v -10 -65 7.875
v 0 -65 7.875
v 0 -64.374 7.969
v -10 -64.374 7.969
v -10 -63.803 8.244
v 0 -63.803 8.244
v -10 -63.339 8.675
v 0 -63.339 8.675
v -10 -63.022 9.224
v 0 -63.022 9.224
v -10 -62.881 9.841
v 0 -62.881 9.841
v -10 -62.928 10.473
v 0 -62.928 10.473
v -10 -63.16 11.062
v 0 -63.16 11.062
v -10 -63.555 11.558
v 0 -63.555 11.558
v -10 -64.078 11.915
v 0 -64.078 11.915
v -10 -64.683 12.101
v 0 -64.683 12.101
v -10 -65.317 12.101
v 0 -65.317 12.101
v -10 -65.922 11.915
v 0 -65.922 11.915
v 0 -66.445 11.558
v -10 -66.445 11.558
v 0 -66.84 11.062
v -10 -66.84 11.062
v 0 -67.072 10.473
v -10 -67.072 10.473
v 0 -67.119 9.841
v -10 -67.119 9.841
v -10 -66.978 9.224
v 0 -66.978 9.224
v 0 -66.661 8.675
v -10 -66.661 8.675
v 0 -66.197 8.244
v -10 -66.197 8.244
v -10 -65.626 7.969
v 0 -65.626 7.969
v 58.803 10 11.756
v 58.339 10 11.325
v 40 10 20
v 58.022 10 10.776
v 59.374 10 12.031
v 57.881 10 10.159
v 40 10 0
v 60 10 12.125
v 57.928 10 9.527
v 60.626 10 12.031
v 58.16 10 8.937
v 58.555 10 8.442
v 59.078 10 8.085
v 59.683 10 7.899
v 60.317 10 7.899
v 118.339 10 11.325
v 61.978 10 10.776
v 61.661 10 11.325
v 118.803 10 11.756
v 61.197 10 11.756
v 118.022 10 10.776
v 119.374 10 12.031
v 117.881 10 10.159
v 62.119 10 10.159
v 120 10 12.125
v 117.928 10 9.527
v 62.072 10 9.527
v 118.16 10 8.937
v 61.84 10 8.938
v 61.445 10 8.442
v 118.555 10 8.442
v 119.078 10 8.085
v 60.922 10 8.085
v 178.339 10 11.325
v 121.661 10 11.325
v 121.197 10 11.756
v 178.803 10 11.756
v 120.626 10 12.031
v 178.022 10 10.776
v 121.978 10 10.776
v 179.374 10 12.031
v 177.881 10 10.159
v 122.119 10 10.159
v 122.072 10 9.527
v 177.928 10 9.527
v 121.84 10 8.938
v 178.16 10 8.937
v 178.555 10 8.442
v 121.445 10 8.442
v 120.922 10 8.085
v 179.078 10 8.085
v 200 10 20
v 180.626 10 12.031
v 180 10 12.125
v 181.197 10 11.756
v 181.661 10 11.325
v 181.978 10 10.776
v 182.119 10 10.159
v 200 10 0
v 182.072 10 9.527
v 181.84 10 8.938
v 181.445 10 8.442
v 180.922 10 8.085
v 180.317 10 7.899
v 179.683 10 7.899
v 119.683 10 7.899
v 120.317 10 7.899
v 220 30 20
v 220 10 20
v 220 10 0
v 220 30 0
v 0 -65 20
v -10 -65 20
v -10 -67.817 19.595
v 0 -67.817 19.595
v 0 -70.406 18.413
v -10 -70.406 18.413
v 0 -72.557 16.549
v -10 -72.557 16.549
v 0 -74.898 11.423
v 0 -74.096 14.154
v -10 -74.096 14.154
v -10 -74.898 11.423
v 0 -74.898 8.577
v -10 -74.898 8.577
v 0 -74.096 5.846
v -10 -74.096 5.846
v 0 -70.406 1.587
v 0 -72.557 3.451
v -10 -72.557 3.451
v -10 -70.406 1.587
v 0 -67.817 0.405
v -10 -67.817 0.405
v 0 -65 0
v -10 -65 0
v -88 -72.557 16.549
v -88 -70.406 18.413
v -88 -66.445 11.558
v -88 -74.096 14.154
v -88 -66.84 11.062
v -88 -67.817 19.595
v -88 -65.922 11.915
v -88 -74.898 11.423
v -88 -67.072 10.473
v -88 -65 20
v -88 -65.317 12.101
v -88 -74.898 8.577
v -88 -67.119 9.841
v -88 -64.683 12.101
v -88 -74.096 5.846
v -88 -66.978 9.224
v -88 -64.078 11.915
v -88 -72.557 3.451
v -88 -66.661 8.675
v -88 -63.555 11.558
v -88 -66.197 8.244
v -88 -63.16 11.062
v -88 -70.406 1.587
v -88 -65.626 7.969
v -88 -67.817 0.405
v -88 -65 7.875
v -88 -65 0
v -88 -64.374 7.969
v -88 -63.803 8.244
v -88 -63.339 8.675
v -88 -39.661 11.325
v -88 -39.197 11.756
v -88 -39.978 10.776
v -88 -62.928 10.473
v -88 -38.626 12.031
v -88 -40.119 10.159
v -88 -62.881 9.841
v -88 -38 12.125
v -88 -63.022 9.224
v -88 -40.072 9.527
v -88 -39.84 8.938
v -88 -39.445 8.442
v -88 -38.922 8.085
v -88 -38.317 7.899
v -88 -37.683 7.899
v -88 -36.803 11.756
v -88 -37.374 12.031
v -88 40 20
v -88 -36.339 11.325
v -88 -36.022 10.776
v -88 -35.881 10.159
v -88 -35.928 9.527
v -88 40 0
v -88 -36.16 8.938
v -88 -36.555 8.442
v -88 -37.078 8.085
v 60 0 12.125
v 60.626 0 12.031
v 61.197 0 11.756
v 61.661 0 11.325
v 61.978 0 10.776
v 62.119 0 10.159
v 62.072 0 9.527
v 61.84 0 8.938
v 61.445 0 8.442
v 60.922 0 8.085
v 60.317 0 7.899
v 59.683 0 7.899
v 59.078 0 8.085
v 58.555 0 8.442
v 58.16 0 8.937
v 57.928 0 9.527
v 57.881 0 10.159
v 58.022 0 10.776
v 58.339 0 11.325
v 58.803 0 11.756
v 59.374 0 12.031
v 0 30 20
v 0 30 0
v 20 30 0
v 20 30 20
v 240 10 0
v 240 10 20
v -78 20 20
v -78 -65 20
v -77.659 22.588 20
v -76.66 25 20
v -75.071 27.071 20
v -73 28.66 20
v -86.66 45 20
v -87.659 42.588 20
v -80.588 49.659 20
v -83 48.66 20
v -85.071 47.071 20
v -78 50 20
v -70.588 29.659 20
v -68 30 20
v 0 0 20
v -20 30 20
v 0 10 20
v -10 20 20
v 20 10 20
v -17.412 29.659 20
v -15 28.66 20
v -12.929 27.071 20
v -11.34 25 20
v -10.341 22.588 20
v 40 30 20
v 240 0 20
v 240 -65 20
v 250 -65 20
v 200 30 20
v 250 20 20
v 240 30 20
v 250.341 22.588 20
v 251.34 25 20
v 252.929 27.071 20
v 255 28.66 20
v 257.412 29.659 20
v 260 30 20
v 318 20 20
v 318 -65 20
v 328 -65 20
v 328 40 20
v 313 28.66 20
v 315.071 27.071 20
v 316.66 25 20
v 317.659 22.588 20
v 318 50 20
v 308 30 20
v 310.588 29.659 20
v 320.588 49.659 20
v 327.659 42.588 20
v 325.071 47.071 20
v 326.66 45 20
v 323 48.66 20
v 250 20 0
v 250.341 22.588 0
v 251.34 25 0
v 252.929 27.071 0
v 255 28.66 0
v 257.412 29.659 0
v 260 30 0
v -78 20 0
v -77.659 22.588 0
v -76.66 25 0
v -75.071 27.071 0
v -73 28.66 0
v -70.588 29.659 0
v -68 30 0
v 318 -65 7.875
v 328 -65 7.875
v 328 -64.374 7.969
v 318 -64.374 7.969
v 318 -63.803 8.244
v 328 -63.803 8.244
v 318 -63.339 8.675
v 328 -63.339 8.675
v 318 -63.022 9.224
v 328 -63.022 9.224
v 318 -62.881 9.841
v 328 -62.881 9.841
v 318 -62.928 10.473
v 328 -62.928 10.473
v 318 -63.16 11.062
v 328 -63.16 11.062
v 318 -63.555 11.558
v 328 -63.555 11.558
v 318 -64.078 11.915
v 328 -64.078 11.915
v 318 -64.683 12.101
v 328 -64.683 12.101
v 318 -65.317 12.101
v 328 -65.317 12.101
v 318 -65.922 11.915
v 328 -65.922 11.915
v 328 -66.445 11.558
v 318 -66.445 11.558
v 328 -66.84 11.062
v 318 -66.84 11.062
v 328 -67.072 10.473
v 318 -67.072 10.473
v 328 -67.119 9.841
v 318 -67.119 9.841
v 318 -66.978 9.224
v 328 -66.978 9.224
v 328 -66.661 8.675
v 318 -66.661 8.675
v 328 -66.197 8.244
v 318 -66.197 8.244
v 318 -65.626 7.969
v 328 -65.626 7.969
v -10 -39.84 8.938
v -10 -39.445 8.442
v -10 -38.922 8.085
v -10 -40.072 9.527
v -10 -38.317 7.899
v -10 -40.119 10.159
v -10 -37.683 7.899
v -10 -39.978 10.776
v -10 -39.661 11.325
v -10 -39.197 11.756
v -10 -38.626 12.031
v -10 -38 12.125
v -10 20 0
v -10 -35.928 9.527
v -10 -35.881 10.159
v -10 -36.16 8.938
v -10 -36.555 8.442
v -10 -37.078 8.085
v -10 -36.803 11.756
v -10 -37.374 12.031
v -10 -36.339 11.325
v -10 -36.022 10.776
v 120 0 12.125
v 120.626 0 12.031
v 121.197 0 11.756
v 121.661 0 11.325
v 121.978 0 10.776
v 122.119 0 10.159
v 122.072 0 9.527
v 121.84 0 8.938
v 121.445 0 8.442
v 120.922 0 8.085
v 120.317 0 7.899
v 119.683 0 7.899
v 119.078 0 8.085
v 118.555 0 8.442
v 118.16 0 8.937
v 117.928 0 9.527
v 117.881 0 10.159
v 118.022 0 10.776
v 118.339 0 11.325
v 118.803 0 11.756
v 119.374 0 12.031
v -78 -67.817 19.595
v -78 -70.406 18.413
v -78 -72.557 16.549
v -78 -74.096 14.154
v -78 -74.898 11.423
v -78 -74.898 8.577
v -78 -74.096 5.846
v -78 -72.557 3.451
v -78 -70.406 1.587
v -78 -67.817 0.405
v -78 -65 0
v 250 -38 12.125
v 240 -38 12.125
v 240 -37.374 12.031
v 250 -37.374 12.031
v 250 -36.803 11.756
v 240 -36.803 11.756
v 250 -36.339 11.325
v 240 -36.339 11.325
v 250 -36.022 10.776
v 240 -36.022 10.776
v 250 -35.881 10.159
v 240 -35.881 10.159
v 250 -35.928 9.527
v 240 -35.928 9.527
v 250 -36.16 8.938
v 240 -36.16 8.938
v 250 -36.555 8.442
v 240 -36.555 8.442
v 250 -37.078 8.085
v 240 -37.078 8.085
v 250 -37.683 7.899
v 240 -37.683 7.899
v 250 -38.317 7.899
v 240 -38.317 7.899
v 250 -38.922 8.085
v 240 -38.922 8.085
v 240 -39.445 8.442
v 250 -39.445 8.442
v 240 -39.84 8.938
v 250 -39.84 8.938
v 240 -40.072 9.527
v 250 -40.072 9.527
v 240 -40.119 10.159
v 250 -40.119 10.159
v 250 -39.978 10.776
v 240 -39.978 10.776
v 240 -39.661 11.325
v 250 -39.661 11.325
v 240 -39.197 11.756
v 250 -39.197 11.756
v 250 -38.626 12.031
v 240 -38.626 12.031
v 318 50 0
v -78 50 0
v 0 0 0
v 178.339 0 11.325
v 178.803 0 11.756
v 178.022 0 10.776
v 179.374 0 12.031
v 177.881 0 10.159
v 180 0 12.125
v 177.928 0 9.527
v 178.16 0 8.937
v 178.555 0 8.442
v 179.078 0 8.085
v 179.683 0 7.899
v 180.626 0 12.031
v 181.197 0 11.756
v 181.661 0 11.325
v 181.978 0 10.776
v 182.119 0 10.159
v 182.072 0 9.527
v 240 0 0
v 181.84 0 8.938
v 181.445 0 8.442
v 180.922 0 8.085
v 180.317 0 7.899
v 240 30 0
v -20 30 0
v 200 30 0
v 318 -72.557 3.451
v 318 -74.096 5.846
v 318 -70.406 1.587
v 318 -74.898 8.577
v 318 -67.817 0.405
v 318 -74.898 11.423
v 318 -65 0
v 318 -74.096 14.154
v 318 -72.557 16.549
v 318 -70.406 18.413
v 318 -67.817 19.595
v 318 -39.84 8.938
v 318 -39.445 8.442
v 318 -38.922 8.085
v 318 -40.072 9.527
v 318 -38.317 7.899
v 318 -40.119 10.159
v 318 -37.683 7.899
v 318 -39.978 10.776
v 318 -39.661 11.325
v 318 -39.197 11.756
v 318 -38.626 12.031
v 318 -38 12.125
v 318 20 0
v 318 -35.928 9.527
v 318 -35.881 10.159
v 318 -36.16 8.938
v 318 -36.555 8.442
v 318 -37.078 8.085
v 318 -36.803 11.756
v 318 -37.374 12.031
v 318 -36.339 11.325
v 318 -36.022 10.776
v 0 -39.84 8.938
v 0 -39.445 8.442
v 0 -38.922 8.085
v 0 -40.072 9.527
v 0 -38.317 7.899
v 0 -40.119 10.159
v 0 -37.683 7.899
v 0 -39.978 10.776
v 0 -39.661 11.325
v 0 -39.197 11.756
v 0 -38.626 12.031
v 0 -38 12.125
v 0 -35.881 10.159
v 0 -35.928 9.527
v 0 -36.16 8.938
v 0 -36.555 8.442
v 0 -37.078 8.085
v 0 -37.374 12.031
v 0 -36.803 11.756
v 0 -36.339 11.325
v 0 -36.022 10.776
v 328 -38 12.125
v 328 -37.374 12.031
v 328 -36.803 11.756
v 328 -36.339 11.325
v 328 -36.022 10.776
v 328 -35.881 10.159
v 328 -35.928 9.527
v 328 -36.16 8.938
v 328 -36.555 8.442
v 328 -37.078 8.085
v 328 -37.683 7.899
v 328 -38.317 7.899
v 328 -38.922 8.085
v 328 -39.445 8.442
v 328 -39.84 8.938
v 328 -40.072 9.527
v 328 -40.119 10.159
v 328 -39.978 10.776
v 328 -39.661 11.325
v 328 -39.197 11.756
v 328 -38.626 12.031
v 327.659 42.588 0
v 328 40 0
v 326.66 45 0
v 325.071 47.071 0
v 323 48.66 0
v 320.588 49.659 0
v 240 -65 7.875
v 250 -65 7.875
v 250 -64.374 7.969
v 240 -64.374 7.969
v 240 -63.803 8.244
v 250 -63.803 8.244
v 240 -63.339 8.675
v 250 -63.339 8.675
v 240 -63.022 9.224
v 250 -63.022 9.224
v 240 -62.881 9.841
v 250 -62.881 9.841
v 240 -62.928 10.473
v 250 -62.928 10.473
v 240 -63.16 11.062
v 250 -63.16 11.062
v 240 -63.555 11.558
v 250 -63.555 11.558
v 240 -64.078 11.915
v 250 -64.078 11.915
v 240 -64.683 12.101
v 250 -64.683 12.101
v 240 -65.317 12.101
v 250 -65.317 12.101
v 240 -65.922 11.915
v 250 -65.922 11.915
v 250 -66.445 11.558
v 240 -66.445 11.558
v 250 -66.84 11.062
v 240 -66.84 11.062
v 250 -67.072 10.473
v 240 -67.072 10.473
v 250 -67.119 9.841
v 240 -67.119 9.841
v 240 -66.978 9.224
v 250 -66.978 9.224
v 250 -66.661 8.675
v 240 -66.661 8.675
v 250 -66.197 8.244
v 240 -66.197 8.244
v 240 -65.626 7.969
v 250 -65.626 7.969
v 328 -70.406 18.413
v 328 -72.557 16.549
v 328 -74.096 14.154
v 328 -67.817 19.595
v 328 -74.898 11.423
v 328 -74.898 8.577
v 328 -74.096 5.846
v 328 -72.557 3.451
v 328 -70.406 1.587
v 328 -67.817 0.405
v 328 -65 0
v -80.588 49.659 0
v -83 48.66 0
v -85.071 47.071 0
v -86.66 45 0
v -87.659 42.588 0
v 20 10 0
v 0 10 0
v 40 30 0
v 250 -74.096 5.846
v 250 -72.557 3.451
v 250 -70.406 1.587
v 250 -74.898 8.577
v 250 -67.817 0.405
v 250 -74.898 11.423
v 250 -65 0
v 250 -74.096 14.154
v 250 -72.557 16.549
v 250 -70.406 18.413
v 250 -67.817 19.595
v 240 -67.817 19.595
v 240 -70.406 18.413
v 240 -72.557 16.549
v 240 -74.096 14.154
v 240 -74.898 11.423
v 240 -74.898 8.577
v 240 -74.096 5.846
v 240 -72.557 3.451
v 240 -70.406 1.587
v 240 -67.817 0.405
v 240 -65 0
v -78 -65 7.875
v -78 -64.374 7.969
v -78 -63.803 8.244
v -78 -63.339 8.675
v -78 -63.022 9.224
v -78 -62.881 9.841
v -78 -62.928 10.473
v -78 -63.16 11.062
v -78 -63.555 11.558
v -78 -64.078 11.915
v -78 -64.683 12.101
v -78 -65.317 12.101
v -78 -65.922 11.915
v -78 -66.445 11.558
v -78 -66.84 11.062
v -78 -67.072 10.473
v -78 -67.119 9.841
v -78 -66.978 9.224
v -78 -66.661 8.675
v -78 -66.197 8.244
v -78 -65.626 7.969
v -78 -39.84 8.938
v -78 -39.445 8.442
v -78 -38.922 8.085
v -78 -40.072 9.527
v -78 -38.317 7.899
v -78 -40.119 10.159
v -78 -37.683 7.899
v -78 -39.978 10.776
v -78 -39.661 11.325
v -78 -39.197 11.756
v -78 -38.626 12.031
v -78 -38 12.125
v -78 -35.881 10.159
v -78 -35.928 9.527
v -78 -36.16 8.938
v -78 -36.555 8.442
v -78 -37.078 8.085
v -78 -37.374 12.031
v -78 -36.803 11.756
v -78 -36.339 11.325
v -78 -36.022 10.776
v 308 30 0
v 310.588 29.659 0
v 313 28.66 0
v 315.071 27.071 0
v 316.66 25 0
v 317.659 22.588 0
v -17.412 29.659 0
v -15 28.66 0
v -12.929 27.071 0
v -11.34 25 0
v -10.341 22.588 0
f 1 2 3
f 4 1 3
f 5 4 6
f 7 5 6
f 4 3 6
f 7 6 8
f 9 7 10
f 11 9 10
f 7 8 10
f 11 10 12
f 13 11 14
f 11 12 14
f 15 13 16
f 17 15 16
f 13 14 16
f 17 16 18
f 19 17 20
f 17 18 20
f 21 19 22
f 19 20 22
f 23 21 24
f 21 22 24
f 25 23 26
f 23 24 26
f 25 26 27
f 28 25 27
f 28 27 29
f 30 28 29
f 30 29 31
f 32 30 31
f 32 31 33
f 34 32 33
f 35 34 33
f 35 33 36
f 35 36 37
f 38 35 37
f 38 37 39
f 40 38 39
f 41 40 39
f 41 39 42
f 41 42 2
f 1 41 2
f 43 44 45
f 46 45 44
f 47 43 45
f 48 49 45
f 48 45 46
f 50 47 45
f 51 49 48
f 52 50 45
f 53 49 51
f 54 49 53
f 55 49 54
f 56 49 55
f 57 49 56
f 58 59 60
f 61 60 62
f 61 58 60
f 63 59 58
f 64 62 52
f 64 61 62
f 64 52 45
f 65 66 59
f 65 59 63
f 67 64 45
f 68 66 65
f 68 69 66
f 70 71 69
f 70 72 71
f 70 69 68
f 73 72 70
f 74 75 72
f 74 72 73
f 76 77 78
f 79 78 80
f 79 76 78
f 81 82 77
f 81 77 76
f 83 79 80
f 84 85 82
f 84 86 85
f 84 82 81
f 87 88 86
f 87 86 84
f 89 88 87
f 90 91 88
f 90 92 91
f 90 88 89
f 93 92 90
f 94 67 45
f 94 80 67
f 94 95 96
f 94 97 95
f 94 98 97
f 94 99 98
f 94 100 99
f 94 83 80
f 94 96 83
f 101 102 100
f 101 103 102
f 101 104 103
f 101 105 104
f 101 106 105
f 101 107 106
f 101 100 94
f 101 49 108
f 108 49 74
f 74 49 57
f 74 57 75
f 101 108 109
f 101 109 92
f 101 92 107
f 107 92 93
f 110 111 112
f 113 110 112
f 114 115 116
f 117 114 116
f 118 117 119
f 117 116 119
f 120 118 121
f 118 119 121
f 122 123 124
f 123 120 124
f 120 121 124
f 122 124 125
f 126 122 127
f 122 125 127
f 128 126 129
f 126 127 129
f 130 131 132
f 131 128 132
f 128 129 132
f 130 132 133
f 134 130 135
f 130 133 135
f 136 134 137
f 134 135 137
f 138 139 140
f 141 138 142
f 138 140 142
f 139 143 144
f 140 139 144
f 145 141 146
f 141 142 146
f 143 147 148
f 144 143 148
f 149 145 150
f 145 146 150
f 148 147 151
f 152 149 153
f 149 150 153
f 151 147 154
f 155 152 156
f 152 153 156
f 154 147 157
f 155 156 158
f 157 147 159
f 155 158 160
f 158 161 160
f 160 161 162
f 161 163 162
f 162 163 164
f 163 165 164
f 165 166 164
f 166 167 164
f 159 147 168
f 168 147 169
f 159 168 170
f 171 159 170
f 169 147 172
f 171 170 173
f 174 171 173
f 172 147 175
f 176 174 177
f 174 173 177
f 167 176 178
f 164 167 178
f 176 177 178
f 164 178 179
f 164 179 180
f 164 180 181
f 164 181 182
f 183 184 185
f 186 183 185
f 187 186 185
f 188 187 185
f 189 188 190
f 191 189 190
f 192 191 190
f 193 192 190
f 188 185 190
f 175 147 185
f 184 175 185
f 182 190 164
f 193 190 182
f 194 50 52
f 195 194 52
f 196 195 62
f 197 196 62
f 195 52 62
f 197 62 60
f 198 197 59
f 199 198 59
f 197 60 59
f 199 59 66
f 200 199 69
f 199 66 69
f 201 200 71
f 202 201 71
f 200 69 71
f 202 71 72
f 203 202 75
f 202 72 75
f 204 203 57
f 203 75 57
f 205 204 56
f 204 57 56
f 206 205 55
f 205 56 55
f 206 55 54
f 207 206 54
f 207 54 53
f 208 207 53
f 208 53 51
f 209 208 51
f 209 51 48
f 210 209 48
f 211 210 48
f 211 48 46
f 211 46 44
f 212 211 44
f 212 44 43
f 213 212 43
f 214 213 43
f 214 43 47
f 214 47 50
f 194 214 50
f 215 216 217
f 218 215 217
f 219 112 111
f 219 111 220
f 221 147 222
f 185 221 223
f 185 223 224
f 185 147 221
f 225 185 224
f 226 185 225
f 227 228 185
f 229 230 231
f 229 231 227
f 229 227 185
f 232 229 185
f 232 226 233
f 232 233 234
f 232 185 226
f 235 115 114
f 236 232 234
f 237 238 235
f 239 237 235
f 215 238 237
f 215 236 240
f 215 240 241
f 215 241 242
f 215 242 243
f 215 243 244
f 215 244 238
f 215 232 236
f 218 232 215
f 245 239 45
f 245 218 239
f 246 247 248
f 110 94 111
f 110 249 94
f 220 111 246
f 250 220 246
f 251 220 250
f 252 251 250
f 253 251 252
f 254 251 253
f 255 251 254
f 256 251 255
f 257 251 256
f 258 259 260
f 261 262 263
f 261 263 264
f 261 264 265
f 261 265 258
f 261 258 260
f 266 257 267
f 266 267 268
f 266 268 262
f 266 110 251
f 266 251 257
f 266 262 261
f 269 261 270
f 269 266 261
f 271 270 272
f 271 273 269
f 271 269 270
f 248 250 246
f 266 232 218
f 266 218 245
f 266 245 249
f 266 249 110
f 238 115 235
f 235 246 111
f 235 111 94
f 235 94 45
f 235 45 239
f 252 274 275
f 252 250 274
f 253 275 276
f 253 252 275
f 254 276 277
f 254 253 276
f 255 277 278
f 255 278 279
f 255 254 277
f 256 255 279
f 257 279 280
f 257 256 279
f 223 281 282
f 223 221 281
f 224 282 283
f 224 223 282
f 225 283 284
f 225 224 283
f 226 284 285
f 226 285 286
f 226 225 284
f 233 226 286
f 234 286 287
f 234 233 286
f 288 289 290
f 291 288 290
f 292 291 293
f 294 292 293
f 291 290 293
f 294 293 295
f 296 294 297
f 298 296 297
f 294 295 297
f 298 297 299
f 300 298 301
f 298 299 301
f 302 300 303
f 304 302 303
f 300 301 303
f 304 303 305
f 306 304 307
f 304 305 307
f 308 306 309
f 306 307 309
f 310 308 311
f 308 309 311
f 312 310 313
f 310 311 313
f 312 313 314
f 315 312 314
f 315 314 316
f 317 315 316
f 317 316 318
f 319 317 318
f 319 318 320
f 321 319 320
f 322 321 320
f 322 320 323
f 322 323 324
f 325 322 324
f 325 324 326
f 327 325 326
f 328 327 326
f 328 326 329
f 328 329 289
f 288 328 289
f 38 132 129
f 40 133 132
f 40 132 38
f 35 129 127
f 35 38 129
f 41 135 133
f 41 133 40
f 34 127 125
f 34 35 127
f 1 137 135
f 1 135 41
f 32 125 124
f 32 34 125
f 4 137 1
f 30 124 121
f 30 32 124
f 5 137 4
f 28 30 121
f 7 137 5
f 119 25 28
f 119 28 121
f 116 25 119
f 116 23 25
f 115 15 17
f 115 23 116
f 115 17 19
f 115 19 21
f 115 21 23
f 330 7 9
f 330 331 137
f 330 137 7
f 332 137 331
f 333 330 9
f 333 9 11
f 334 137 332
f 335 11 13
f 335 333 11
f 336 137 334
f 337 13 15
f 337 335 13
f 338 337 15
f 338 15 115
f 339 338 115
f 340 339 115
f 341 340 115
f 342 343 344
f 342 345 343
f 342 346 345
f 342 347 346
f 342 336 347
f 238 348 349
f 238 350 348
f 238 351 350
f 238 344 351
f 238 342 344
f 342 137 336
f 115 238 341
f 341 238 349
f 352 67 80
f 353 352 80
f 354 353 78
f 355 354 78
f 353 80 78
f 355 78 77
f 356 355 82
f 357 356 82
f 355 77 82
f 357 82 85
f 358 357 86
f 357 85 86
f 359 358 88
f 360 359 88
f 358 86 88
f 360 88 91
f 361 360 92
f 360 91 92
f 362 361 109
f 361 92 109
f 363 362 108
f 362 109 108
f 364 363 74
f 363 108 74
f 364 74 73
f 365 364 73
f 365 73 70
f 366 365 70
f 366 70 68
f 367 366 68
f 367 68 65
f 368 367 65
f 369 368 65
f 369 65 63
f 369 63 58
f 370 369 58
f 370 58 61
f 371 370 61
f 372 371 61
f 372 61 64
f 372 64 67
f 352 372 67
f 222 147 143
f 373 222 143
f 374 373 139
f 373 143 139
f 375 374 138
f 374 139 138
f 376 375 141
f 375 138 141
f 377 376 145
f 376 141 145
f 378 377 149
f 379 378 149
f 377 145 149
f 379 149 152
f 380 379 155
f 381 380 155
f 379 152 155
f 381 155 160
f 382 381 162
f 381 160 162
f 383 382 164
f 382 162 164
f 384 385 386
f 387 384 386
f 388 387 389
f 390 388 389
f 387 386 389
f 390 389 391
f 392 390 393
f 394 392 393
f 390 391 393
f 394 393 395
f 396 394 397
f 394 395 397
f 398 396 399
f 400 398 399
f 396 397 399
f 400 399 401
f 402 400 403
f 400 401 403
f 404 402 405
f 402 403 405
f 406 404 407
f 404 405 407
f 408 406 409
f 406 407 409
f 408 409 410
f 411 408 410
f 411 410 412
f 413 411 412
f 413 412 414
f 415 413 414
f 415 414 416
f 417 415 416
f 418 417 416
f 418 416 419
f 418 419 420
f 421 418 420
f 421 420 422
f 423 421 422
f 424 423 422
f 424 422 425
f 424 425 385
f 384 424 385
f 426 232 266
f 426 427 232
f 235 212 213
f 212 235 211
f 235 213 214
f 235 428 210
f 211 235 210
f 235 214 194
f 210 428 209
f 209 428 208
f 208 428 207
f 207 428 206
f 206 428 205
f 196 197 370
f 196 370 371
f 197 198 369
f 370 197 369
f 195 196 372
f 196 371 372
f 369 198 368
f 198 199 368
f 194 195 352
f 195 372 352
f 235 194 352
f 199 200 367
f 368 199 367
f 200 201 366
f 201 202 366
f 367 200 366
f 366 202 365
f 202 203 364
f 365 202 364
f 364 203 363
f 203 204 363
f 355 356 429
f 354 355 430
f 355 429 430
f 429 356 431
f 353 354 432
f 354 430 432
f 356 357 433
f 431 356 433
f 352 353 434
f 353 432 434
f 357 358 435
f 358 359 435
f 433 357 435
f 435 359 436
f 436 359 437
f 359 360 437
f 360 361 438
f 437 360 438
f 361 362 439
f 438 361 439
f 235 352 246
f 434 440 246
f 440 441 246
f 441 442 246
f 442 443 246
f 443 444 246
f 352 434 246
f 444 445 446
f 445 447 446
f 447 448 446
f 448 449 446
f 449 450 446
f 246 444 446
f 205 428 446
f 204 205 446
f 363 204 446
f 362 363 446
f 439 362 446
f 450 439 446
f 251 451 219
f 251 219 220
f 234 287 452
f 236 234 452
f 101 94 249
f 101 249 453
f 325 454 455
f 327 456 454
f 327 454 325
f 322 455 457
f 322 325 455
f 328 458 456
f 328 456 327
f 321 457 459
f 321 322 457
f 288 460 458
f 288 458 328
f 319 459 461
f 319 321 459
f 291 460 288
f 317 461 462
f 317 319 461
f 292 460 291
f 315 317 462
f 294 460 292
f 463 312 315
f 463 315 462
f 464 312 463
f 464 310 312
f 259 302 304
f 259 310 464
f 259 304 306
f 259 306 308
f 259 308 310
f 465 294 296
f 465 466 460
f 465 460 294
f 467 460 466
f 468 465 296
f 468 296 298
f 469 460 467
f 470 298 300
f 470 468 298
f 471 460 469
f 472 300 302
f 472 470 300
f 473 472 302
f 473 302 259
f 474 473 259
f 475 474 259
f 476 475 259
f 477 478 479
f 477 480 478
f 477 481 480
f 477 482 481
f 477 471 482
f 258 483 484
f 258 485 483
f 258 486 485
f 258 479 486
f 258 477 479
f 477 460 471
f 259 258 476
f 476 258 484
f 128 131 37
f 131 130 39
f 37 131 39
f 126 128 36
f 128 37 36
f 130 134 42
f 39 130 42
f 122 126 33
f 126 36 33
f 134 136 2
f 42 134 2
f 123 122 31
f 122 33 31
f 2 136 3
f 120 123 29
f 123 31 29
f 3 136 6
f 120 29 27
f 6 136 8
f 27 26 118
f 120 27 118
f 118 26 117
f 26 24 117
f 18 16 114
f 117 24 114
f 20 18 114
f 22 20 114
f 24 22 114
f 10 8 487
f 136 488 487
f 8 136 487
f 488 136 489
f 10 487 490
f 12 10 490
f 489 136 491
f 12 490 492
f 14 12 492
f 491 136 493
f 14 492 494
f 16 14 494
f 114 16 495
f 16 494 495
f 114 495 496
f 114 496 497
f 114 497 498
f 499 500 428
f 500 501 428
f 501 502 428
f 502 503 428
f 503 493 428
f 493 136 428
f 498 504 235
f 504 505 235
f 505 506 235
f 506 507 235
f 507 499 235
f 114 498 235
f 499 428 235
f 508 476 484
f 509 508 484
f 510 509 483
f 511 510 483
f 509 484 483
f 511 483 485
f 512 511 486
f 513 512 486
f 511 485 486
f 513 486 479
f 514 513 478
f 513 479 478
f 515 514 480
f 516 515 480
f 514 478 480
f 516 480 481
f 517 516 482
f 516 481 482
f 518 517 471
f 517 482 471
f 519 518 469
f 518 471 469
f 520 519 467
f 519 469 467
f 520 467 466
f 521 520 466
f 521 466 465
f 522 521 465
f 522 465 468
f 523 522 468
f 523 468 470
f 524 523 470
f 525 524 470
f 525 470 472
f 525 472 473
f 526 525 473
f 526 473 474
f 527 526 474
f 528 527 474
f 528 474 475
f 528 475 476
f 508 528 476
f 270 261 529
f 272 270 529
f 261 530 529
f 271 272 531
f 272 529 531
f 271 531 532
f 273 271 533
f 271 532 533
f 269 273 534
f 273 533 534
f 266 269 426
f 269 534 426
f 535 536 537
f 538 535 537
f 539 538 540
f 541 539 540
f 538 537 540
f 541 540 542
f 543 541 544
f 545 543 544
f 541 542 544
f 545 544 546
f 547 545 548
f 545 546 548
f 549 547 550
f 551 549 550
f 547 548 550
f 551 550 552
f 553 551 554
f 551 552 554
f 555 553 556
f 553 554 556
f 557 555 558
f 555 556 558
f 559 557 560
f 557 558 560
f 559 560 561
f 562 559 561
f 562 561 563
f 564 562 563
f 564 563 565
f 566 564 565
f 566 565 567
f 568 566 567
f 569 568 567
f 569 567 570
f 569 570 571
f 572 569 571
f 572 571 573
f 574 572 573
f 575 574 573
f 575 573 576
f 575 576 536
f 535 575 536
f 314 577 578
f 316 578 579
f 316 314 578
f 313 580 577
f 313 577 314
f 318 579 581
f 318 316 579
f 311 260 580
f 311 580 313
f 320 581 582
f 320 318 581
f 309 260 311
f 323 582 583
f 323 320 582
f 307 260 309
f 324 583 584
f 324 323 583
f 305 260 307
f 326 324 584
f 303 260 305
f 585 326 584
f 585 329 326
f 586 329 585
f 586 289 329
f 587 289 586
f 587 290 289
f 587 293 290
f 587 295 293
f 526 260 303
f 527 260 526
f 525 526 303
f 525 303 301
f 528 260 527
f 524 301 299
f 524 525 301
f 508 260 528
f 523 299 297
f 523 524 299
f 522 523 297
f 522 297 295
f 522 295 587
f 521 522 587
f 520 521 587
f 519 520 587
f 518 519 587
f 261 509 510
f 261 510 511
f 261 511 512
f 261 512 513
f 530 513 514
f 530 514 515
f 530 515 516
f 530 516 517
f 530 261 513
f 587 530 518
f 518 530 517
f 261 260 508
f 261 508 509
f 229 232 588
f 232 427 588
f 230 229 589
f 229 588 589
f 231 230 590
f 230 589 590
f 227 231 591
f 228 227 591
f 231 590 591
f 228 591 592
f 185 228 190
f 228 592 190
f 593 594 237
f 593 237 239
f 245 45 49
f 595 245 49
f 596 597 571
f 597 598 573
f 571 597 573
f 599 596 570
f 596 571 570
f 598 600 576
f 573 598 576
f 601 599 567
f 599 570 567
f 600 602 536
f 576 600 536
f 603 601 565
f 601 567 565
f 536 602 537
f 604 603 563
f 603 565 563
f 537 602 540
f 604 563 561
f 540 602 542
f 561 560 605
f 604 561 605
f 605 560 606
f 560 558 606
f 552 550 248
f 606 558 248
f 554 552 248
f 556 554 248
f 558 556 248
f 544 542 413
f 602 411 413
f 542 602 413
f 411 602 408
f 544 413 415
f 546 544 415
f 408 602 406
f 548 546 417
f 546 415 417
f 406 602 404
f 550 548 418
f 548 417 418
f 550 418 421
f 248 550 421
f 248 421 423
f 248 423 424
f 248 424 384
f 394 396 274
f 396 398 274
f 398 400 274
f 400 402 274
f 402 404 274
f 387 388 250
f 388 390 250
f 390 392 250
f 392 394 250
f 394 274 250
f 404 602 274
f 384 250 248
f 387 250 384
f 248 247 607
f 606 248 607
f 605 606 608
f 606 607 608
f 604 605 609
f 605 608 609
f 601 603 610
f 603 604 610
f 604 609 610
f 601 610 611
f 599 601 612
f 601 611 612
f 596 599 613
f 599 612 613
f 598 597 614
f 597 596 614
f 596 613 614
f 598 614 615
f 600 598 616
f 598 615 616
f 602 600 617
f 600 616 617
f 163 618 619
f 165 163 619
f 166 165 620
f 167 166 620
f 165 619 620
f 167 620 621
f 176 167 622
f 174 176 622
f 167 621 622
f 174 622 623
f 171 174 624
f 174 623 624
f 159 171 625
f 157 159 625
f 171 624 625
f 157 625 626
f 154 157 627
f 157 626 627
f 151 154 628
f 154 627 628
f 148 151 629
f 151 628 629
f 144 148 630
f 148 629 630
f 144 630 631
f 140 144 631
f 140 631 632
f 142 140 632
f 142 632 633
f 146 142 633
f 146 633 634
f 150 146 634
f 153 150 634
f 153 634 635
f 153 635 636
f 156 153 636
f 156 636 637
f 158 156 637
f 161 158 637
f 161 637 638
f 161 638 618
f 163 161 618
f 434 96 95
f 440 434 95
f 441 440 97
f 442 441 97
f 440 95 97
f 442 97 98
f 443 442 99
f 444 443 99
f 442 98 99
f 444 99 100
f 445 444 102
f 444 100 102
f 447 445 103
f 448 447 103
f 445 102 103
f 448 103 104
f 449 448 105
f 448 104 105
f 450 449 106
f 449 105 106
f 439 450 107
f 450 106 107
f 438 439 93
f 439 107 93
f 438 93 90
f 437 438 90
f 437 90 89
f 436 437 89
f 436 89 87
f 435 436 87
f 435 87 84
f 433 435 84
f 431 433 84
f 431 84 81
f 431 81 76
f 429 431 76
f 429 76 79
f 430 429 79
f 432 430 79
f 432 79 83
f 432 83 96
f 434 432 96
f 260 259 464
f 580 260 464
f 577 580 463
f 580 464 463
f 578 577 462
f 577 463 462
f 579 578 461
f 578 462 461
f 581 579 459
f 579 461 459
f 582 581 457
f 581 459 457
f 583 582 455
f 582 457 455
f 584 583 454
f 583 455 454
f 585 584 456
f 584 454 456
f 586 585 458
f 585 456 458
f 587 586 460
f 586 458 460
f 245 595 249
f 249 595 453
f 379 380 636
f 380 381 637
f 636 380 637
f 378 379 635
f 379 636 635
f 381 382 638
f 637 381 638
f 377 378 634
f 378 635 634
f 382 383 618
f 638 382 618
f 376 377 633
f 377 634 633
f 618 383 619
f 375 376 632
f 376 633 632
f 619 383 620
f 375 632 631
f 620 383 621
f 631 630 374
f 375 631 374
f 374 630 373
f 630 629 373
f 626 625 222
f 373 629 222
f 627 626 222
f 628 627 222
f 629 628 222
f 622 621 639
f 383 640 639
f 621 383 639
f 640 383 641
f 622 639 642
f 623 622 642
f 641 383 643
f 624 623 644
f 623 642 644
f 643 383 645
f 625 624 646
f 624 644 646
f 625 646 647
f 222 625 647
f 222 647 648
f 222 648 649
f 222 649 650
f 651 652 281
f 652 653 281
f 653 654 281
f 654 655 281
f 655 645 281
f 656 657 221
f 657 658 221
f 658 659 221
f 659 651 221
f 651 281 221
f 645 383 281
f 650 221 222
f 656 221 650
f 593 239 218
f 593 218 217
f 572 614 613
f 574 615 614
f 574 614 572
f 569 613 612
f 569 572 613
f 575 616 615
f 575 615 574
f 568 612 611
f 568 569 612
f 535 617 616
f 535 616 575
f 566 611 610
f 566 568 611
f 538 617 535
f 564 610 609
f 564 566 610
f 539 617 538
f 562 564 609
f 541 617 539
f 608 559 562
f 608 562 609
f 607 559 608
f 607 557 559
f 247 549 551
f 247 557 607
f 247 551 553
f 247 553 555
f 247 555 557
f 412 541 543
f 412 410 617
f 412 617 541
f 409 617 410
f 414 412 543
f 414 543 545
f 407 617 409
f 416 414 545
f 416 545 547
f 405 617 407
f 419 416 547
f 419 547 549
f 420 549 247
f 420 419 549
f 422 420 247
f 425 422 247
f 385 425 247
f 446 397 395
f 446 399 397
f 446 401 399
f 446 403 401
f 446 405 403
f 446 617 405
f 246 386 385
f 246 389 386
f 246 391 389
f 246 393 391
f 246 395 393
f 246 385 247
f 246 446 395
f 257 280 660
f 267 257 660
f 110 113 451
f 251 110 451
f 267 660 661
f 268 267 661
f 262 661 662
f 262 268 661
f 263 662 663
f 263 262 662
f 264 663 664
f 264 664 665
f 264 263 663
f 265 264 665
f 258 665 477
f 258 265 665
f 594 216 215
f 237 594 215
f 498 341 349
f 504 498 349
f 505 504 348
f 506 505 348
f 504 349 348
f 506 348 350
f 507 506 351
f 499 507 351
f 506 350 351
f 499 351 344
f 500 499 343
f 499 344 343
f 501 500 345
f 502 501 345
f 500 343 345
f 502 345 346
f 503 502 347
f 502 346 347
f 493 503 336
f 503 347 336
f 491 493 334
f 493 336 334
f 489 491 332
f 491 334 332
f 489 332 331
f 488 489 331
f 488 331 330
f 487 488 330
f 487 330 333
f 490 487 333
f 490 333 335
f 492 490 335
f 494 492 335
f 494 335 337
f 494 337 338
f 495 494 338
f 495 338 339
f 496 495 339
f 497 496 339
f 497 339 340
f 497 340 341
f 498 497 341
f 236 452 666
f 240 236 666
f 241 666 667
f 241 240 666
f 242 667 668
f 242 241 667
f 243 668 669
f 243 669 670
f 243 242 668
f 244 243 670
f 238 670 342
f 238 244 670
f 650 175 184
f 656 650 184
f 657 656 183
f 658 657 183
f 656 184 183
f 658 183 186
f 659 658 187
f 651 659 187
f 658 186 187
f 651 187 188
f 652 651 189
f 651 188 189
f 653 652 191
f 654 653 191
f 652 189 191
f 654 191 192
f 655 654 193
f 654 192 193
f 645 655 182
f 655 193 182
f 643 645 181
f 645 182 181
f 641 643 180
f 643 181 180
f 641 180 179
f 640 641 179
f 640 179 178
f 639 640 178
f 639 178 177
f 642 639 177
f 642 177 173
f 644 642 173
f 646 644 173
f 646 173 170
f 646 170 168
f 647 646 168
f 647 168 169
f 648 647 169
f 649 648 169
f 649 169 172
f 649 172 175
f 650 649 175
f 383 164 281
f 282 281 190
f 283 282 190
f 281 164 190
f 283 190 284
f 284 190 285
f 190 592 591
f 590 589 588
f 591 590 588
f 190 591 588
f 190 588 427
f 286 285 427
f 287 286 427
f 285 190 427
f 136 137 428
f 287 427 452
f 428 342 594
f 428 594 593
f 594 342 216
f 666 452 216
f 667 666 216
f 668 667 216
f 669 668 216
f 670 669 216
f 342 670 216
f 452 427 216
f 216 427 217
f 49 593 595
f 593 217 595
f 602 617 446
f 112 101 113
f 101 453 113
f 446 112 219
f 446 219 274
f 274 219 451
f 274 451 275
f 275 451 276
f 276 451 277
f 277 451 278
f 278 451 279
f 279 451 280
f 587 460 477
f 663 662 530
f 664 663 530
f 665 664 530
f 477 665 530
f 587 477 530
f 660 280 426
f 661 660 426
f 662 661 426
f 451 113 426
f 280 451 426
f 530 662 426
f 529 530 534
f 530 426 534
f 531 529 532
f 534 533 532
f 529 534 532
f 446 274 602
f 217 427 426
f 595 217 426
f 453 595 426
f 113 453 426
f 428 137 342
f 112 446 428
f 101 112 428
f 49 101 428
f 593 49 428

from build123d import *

# Parameters (mm, degrees)
SKETCH2_W           = 240
SKETCH2_H           = 10
BOSS_EXTRUDE1_DEPTH = 20
SKETCH3_R           = 2.125
CUT_EXTRUDE1_DEPTH  = 20
SKETCH4_W           = 20
SKETCH4_H           = 20
BOSS_EXTRUDE2_DEPTH = 20
SKETCH5_W           = 416
SKETCH5_H           = 20
BOSS_EXTRUDE3_DEPTH = 20
SKETCH6_W           = 10
SKETCH6_H           = 20
BOSS_EXTRUDE4_DEPTH = 95
BOSS_EXTRUDE5_REACH = 423.522
SKETCH8_W           = 68
SKETCH8_H           = 10
SKETCH8_W_2         = 240
CUT_EXTRUDE2_DEPTH  = 65
CUT_EXTRUDE3_REACH  = 425.18
SKETCH9_R           = 2.125
FILLET1_R           = 10
CUT_EXTRUDE4_REACH  = 425.18
SKETCH10_R          = 2.125


with BuildPart() as part:
    # Sketch2 → Boss-Extrude1 (new body)
    with BuildSketch(Plane.XY):
        with Locations((120, 5)):
            Rectangle(SKETCH2_W, SKETCH2_H)
    extrude(amount=BOSS_EXTRUDE1_DEPTH)

    # Sketch3 → Cut-Extrude1 (cut)
    with BuildSketch(Plane(origin=(0, 10, 0), x_dir=(1, 0, 0), z_dir=(0, 1, 0))):
        with Locations(Location((60, -10, 0), (0, 0, 270))):
            Circle(SKETCH3_R)
        with Locations(Location((120, -10, 0), (0, 0, 270))):
            Circle(SKETCH3_R)
        with Locations(Location((180, -10, 0), (0, 0, 270))):
            Circle(SKETCH3_R)
    extrude(amount=-CUT_EXTRUDE1_DEPTH, mode=Mode.SUBTRACT)

    # Sketch4 → Boss-Extrude2 (add)
    with BuildSketch(Plane(origin=(0, 10, 0), x_dir=(1, 0, 0), z_dir=(0, 1, 0))):
        with Locations((30, -10)):
            Rectangle(SKETCH4_W, SKETCH4_H)
        with Locations((210, -10)):
            Rectangle(SKETCH4_W, SKETCH4_H)
    extrude(amount=BOSS_EXTRUDE2_DEPTH)

    # Sketch5 → Boss-Extrude3 (add)
    with BuildSketch(Plane(origin=(0, 30, 0), x_dir=(1, 0, 0), z_dir=(0, 1, 0))):
        with Locations((120, -10)):
            Rectangle(SKETCH5_W, SKETCH5_H)
    extrude(amount=BOSS_EXTRUDE3_DEPTH)

    # Sketch6 → Boss-Extrude4 (add)
    with BuildSketch(Plane.XZ.offset(-30)):
        with Locations((245, 10)):
            Rectangle(SKETCH6_W, SKETCH6_H)
        with Locations((-5, 10)):
            Rectangle(SKETCH6_W, SKETCH6_H)
        with Locations((323, 10)):
            Rectangle(SKETCH6_W, SKETCH6_H)
        with Locations((-83, 10)):
            Rectangle(SKETCH6_W, SKETCH6_H)
    extrude(amount=BOSS_EXTRUDE4_DEPTH)

    # Boss-Extrude5: up to this face of the body (flat: up to its plane)
    boss_extrude5_end = Plane(part.part.faces().sort_by_distance((328, -7.5, 10))[0])
    # Sketch7 → Boss-Extrude5 (add, up to the picked face)
    with BuildSketch(Plane.ZY.offset(88), mode=Mode.PRIVATE) as boss_extrude5_sk1:
        with BuildLine():
            Line((0, -65), (20, -65))
            ThreePointArc((20, -65), (10, -75), (0, -65))
        make_face()
    boss_extrude5_tool1 = split(extrude(boss_extrude5_sk1.sketch, amount=-BOSS_EXTRUDE5_REACH, mode=Mode.PRIVATE), bisect_by=boss_extrude5_end, keep=Keep.BOTH, mode=Mode.PRIVATE)
    add(boss_extrude5_tool1.solids().sort_by(Axis((-88, -69.244132, 10), (1, 0, 0)))[0])

    # Sketch8 → Cut-Extrude2 (cut)
    with BuildSketch(Plane(origin=(0, 0, 0), x_dir=(-1, 0, 0), z_dir=(0, 0, -1))):
        with Locations((-284, -70)):
            Rectangle(SKETCH8_W, SKETCH8_H)
        with Locations((-120, -70)):
            Rectangle(SKETCH8_W_2, SKETCH8_H)
        with Locations((44, -70)):
            Rectangle(SKETCH8_W, SKETCH8_H)
    extrude(amount=-CUT_EXTRUDE2_DEPTH, mode=Mode.SUBTRACT)

    # Cut-Extrude3: up to this face of the body (flat: up to its plane)
    cut_extrude3_end = Plane(part.part.faces().sort_by_distance((328, -11.447265452, 10))[0])
    # Sketch9 → Cut-Extrude3 (cut, up to the picked face)
    with BuildSketch(Plane.ZY.offset(88), mode=Mode.PRIVATE) as cut_extrude3_sk1:
        with Locations((10, -38)):
            Circle(SKETCH9_R)
    cut_extrude3_tool1 = split(extrude(cut_extrude3_sk1.sketch, amount=-CUT_EXTRUDE3_REACH, mode=Mode.PRIVATE), bisect_by=cut_extrude3_end, keep=Keep.BOTH, mode=Mode.PRIVATE)
    add(cut_extrude3_tool1.solids().sort_by(Axis((-88, -38, 10), (1, 0, 0)))[0], mode=Mode.SUBTRACT)

    # Fillet1
    fillet1_edges = [part.edges().sort_by_distance(p)[0] for p in [
        (318, 30, 10),
        (-78, 30, 10),
        (-88, 50, 10),
        (328, 50, 10),
        (250, 30, 10),
        (-10, 30, 10),
    ]]
    fillet(fillet1_edges, radius=FILLET1_R)

    # Cut-Extrude4: up to this face of the body (flat: up to its plane)
    cut_extrude4_end = Plane(part.part.faces().sort_by_distance((-88, -16.31275275, 10))[0])
    # Sketch10 → Cut-Extrude4 (cut, up to the picked face)
    with BuildSketch(Plane(origin=(328, 0, 0), x_dir=(0, 0, -1), z_dir=(1, 0, 0)), mode=Mode.PRIVATE) as cut_extrude4_sk1:
        with Locations((-10, -65)):
            Circle(SKETCH10_R)
    cut_extrude4_tool1 = split(extrude(cut_extrude4_sk1.sketch, amount=-CUT_EXTRUDE4_REACH, mode=Mode.PRIVATE), bisect_by=cut_extrude4_end, keep=Keep.BOTH, mode=Mode.PRIVATE)
    add(cut_extrude4_tool1.solids().sort_by(Axis((328, -65, 10), (-1, 0, 0)))[0], mode=Mode.SUBTRACT)


solid = part.part
